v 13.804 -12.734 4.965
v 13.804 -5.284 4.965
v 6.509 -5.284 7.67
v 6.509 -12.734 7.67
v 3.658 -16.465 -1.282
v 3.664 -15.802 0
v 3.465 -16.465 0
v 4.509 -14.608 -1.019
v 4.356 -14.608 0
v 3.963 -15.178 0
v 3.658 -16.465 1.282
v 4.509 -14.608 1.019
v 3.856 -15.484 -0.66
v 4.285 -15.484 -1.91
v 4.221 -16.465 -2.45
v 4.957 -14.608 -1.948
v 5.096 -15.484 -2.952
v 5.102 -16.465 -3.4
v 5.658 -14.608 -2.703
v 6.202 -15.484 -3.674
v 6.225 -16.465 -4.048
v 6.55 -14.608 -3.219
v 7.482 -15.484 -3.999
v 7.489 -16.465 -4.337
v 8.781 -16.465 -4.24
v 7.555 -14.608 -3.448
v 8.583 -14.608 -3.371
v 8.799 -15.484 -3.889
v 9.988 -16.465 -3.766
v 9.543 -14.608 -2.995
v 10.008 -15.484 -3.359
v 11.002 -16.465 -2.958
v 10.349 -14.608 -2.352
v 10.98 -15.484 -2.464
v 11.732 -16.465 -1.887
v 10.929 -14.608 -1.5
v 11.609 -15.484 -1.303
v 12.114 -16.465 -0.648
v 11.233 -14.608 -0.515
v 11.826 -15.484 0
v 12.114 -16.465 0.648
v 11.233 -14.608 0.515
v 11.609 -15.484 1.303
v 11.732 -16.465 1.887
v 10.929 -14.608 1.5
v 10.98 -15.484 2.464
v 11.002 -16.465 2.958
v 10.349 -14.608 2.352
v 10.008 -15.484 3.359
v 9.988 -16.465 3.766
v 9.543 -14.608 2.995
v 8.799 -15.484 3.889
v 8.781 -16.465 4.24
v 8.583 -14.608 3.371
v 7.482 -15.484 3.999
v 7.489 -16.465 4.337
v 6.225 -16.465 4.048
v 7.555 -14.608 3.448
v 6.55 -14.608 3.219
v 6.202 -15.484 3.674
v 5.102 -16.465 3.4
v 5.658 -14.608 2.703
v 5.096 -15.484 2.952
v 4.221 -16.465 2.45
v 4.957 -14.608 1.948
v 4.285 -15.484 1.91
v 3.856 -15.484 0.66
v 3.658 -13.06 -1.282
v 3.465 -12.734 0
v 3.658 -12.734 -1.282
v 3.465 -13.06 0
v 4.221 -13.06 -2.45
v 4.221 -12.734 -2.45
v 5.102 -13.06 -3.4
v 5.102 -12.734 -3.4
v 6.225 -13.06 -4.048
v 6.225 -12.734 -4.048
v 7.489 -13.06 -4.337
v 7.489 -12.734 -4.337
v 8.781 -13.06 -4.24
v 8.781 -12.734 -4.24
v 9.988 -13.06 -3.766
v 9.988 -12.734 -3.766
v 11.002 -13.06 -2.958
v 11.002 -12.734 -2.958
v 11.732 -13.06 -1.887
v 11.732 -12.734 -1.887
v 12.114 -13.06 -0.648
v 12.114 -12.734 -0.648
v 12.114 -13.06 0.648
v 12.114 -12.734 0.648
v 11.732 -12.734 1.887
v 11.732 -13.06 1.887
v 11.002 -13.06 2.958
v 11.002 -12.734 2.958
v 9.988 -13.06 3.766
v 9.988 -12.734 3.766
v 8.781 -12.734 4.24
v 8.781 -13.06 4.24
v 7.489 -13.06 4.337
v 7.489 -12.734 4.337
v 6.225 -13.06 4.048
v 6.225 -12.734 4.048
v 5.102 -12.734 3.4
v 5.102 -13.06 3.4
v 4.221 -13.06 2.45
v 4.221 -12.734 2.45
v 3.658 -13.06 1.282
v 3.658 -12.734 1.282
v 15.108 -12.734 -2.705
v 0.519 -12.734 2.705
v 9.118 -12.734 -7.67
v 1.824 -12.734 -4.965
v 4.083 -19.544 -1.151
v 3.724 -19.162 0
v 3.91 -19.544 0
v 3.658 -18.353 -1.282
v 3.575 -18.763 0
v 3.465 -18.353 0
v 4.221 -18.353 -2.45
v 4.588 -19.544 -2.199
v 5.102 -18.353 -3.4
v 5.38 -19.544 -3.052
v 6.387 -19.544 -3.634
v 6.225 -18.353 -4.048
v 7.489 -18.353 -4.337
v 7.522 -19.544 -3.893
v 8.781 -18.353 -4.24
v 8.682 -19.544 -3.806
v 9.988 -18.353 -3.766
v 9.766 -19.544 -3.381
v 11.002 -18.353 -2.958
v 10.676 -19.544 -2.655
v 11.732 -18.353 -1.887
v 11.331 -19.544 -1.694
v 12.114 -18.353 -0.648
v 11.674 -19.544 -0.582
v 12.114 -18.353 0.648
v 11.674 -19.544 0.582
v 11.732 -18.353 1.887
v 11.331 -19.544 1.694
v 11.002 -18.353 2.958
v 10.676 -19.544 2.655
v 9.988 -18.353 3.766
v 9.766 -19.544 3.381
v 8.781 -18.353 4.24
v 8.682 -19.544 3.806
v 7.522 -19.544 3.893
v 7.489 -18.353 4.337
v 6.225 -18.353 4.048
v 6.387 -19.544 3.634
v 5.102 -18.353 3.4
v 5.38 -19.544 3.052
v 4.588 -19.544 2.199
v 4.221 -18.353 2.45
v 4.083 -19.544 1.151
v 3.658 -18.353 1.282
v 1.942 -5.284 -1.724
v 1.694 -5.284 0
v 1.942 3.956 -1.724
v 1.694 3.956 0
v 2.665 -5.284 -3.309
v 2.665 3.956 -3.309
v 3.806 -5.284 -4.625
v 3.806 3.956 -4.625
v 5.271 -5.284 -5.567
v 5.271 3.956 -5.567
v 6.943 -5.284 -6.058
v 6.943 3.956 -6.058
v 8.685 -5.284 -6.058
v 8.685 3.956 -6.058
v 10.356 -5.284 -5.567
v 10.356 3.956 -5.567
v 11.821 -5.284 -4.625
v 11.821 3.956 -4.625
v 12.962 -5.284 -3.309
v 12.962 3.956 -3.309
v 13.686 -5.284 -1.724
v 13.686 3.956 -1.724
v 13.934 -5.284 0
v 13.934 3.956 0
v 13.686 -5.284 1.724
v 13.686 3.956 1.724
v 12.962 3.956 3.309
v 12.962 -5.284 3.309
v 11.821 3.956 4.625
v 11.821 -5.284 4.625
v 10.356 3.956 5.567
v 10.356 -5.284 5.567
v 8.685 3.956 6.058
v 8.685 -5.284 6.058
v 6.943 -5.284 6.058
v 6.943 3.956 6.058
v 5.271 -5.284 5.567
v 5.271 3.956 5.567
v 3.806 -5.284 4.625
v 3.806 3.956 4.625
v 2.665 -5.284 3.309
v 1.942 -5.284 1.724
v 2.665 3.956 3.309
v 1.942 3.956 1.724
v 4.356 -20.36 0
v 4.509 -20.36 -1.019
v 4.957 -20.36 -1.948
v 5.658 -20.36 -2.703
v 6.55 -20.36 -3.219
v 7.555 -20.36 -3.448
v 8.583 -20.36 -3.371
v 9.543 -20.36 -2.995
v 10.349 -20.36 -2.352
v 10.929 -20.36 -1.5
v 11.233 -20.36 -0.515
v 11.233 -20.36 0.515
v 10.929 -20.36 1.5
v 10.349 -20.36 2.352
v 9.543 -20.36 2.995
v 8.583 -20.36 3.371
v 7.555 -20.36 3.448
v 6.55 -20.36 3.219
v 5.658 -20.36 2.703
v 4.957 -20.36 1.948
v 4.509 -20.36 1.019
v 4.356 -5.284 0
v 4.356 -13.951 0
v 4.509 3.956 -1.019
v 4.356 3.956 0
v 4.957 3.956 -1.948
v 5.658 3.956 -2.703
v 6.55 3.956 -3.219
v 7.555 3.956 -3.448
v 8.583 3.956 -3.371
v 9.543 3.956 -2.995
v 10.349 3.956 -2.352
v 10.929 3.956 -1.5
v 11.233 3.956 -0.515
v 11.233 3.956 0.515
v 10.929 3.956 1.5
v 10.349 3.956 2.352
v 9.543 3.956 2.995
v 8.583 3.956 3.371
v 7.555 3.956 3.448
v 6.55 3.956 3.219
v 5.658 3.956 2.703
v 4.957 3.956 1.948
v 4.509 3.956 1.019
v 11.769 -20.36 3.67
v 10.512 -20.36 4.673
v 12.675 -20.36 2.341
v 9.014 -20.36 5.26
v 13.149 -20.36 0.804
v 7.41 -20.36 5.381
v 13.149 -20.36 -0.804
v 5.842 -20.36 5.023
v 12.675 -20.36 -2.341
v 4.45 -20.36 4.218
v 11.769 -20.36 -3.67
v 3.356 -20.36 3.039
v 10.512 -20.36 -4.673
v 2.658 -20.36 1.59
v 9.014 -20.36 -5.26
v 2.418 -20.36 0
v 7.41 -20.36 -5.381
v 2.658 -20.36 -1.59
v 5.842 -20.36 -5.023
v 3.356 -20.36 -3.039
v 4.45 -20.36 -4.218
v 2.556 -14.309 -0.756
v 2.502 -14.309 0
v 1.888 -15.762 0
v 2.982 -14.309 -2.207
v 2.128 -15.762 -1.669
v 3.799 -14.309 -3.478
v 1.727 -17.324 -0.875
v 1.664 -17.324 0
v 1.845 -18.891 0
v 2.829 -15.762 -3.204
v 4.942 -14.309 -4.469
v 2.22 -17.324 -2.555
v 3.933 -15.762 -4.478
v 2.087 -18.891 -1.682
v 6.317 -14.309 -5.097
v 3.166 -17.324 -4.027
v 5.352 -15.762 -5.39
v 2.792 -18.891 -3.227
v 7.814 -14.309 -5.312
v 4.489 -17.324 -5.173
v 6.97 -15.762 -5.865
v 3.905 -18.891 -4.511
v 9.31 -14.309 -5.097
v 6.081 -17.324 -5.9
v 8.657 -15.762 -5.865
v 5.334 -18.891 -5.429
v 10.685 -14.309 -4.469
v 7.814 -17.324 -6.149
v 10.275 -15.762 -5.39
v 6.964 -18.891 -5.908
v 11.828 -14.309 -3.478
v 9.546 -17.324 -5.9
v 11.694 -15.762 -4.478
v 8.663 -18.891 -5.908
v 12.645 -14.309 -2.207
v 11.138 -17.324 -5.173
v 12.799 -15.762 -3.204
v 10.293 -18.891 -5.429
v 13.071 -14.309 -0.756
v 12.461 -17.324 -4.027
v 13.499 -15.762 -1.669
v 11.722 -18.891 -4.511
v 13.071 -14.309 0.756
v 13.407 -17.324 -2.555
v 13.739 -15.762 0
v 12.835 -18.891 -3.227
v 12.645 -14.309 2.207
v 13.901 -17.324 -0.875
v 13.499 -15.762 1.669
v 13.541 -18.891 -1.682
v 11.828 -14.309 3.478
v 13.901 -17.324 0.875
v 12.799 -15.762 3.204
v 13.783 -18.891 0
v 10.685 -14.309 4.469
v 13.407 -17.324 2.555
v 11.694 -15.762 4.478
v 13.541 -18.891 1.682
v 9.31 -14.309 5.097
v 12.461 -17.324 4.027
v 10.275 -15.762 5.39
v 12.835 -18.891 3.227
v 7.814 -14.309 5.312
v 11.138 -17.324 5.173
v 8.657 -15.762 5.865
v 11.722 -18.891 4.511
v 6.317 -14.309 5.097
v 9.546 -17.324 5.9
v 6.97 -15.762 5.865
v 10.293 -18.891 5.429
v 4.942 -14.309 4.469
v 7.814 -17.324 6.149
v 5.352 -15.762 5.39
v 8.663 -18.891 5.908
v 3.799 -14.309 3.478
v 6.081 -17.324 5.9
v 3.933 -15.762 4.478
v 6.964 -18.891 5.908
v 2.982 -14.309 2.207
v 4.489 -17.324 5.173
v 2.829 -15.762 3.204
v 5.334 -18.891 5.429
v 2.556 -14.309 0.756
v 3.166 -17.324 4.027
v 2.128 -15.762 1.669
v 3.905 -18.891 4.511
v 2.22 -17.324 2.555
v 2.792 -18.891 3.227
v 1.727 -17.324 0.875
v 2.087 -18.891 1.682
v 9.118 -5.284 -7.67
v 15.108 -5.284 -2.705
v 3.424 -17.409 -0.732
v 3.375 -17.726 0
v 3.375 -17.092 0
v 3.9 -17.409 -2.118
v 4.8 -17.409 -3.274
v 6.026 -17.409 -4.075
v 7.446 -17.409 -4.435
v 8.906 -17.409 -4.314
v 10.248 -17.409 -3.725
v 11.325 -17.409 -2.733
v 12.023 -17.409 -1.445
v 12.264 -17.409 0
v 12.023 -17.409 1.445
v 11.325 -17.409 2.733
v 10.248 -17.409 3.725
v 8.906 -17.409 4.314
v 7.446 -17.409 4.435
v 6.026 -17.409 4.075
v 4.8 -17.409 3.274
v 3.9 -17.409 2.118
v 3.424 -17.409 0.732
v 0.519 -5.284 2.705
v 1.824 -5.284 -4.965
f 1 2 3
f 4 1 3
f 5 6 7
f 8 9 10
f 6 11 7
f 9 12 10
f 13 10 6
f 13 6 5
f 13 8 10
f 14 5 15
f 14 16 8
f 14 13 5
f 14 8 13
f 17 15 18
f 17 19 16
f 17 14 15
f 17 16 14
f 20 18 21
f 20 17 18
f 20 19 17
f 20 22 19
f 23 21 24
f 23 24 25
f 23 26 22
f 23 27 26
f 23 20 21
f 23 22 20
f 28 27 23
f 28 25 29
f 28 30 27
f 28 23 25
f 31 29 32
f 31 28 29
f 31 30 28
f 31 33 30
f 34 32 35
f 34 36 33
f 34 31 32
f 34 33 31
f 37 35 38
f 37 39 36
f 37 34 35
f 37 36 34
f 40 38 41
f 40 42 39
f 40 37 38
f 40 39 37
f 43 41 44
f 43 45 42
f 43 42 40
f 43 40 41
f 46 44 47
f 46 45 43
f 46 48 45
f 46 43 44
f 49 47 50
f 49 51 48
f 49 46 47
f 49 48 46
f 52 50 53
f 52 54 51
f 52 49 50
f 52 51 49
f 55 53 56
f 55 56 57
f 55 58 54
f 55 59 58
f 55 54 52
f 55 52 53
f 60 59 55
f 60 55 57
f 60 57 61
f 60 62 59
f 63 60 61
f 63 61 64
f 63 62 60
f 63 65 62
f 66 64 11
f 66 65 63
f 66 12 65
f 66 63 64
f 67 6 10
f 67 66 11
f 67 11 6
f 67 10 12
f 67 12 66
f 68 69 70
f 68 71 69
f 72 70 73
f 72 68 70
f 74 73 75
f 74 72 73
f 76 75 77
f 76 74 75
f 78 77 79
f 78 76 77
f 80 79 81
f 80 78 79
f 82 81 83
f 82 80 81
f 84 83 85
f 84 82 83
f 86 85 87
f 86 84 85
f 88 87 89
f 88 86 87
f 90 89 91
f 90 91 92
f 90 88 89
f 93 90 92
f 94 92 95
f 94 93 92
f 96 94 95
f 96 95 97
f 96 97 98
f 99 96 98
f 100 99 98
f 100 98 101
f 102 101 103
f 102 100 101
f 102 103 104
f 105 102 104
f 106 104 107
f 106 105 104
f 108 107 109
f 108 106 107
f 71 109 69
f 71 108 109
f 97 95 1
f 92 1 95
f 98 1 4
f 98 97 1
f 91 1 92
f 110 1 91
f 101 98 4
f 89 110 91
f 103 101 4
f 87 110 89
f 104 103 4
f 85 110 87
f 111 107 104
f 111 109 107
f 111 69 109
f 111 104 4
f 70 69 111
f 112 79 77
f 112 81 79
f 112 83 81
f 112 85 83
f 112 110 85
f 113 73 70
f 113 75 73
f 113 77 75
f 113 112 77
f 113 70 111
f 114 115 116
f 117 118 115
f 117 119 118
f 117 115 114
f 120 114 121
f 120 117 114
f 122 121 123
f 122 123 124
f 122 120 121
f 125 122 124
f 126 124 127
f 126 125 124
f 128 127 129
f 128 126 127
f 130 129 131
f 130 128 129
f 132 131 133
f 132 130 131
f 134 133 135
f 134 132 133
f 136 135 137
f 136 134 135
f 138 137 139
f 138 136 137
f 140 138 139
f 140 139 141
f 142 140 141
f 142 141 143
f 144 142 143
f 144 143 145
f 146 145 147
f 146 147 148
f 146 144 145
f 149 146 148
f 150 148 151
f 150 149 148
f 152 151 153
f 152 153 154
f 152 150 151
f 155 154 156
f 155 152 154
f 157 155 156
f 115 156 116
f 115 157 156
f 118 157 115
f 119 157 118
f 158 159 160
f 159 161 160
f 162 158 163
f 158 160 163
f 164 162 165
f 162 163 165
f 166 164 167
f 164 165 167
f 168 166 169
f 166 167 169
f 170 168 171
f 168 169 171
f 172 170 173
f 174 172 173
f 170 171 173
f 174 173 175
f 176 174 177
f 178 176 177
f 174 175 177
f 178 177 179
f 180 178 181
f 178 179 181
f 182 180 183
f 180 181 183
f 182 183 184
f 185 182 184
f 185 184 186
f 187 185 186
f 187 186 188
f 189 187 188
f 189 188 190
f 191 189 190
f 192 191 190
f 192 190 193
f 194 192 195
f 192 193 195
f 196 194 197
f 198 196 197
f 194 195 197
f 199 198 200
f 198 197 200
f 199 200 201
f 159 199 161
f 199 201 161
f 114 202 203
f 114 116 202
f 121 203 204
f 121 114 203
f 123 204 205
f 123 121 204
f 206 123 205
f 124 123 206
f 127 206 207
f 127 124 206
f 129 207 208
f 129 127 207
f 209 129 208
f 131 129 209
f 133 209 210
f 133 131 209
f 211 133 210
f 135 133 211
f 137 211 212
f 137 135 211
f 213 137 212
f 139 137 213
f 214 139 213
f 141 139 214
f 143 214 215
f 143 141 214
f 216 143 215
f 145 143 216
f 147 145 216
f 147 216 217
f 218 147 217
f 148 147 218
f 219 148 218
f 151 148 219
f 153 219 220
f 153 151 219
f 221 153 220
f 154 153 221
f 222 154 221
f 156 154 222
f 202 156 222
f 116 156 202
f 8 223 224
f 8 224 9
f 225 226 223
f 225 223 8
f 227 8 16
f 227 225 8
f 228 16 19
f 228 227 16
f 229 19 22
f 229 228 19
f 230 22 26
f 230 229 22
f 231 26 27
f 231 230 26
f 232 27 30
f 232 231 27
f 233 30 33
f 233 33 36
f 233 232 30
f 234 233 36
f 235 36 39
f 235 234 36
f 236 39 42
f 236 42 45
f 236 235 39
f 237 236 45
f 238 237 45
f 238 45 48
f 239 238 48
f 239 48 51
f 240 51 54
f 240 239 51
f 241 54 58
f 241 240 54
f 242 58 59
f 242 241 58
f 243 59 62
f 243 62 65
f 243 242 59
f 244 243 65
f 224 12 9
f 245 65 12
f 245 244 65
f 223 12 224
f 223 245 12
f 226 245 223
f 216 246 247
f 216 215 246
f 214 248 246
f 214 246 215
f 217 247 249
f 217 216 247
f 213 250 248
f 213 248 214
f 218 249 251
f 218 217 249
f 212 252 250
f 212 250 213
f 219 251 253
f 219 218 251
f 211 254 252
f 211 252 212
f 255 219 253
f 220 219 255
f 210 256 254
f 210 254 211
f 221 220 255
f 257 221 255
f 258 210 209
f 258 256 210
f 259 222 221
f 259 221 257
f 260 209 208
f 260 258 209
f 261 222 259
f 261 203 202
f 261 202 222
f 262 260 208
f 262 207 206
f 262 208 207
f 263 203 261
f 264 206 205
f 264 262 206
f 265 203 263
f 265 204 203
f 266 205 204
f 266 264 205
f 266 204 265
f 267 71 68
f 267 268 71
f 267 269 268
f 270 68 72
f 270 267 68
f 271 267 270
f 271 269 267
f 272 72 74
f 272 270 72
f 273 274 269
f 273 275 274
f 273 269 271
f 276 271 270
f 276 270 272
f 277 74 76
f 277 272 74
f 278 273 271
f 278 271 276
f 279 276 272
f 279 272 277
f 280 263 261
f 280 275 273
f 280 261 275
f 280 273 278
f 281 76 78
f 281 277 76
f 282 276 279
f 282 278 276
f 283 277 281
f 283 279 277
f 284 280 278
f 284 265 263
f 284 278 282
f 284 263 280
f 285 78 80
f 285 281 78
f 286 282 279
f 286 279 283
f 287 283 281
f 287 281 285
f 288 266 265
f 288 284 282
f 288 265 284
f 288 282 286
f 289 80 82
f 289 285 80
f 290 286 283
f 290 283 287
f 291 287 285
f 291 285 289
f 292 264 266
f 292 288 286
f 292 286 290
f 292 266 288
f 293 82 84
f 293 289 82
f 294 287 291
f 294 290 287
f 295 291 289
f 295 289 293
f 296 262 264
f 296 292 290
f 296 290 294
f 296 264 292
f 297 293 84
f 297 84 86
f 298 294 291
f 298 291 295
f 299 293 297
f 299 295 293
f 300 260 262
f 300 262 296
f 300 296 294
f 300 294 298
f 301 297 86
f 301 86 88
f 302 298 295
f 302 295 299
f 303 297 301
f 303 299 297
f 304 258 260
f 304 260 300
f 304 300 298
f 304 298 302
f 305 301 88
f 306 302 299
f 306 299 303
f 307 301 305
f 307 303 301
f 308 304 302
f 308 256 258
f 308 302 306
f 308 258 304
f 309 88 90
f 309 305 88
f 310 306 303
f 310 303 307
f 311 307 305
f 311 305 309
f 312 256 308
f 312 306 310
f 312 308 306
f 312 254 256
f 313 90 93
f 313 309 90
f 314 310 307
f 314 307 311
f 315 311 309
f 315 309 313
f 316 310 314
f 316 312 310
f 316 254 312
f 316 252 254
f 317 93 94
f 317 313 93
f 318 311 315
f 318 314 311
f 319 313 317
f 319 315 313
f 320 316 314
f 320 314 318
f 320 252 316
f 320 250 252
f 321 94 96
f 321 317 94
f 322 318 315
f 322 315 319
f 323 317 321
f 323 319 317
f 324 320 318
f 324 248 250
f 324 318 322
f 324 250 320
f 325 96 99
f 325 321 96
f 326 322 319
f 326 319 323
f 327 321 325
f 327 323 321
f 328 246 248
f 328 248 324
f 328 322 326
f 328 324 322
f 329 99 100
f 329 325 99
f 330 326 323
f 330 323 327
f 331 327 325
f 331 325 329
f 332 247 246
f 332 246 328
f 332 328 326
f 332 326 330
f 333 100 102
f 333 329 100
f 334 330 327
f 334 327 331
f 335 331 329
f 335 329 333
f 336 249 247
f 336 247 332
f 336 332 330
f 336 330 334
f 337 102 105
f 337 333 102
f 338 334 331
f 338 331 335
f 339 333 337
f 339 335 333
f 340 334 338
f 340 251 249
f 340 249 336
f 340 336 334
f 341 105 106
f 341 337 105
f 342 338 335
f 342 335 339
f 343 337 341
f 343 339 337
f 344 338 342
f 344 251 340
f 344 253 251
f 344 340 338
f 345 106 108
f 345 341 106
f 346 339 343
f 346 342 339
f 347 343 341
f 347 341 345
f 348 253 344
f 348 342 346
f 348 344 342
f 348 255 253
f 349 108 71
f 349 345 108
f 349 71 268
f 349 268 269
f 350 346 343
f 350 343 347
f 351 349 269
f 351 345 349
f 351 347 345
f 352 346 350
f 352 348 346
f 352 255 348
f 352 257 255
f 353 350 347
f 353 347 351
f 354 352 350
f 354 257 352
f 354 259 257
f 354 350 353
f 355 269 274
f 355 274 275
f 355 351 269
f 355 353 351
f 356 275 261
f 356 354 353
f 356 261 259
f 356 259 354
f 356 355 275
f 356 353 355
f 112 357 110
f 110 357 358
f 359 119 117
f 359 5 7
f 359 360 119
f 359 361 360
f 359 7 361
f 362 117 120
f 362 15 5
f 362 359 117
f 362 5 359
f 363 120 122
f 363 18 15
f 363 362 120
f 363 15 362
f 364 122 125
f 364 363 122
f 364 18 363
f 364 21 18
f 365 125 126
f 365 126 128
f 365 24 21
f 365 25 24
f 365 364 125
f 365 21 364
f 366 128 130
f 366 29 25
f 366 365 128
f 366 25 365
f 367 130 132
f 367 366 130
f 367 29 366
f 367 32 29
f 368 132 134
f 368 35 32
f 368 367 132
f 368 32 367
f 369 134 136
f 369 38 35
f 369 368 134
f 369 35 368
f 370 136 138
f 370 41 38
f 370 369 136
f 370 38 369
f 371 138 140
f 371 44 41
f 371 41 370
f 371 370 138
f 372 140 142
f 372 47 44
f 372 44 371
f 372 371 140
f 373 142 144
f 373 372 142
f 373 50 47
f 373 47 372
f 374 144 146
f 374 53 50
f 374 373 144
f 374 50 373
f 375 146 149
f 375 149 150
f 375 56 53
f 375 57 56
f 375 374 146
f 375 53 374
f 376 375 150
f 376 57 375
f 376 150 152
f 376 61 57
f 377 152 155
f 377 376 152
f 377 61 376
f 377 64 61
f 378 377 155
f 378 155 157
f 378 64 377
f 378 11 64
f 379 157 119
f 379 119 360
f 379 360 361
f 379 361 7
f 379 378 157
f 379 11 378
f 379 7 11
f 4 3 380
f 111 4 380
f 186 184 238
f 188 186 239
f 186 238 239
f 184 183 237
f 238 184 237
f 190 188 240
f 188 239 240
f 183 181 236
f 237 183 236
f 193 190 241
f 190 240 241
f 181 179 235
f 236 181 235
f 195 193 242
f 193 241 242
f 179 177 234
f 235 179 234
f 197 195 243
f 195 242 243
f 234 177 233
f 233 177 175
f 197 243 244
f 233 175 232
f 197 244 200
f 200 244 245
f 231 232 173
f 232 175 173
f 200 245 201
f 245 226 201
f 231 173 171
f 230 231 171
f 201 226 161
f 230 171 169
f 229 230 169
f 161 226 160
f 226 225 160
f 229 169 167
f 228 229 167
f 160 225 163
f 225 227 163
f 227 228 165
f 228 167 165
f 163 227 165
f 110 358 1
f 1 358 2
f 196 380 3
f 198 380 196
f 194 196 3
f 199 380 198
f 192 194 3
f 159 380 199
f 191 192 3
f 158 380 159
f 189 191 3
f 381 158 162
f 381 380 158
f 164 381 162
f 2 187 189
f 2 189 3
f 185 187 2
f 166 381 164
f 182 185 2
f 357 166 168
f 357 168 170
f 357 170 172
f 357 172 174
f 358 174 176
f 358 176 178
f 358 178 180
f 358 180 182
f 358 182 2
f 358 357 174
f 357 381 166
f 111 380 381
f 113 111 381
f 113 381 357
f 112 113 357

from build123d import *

# Parameters (mm, degrees)
CROQUIS1_W            = 2.662106529
CROQUIS1_H            = 9.24
CORTAR_EXTRUIR1_REACH = 25.043


with BuildPart() as part:
    # Croquis1 → Revolución1 (revolve)
    with BuildSketch(Plane.XY):
        with Locations((3.024759969, -0.663755178)):
            Rectangle(CROQUIS1_W, CROQUIS1_H)
        Polygon((4.355813233, -12.733755178), (4.355813233, -5.283755178), (1.693706704, -5.283755178), (0.033706704, -5.283755178), (0.033706704, -12.733755178), (3.465, -12.733755178), align=None)
        Polygon((4.355813233, -13.950813233), (4.355813233, -12.733755178), (3.465, -12.733755178), (3.465, -13.06), align=None)
        with BuildLine():
            Line((4.355813233, -14.607729599), (4.355813233, -13.950813233))
            Line((4.355813233, -13.950813233), (3.465, -13.06))
            Line((3.465, -13.06), (3.465, -16.464646325))
            ThreePointArc((3.465, -16.464646325), (3.80150201, -15.483943474), (4.355813233, -14.607729599))
        make_face()
        with BuildLine():
            Line((3.465, -16.464646325), (3.465, -13.06))
            ThreePointArc((3.465, -13.06), (1.725988008, -16.53567688), (2.418118888, -20.36))
            Line((2.418118888, -20.36), (3.465, -20.36))
            Line((3.465, -20.36), (3.465, -18.352767084))
            ThreePointArc((3.465, -18.352767084), (3.363706704, -17.408706704), (3.465, -16.464646325))
        make_face()
        with BuildLine():
            Line((3.465, -20.36), (4.355813233, -20.36))
            Line((4.355813233, -20.36), (3.909582187, -19.544195349))
            ThreePointArc((3.909582187, -19.544195349), (3.644512403, -18.964444111), (3.465, -18.352767084))
            Line((3.465, -18.352767084), (3.465, -20.36))
        make_face()
    revolve(axis=Axis((7.813706704, 3.956244822, 0), (0, -1, 0)))

    # Croquis2 → Cortar-Extruir1 (cut, up to next)
    with BuildSketch(Plane(origin=(0, -5.283755178, 0), x_dir=(-1, 0, 0), z_dir=(0, 1, 0)), mode=Mode.PRIVATE) as cortar_extruir1_sk1:
        with BuildLine():
            ThreePointArc((-6.509101958, 7.669837447), (-10.518804576, 7.294576445), (-13.803678403, 4.964739575))
            Line((-13.803678403, 4.964739575), (-6.509101958, 7.669837447))
        make_face()
    cortar_extruir1_tool1 = extrude(cortar_extruir1_sk1.sketch, amount=-CORTAR_EXTRUIR1_REACH, mode=Mode.PRIVATE) & part.part
    # Croquis2 → Cortar-Extruir1 (cut, up to next)
    with BuildSketch(Plane(origin=(0, -5.283755178, 0), x_dir=(-1, 0, 0), z_dir=(0, 1, 0)), mode=Mode.PRIVATE) as cortar_extruir1_sk2:
        with BuildLine():
            Line((-15.108283149, -2.705097871), (-13.803678403, 4.964739575))
            ThreePointArc((-13.803678403, 4.964739575), (-15.483544151, 1.304604746), (-15.108283149, -2.705097871))
        make_face()
    cortar_extruir1_tool2 = extrude(cortar_extruir1_sk2.sketch, amount=-CORTAR_EXTRUIR1_REACH, mode=Mode.PRIVATE) & part.part
    # Croquis2 → Cortar-Extruir1 (cut, up to next)
    with BuildSketch(Plane(origin=(0, -5.283755178, 0), x_dir=(-1, 0, 0), z_dir=(0, 1, 0)), mode=Mode.PRIVATE) as cortar_extruir1_sk3:
        with BuildLine():
            Line((-9.11831145, -7.669837447), (-15.108283149, -2.705097871))
            ThreePointArc((-15.108283149, -2.705097871), (-12.77844628, -5.989971699), (-9.11831145, -7.669837447))
        make_face()
    cortar_extruir1_tool3 = extrude(cortar_extruir1_sk3.sketch, amount=-CORTAR_EXTRUIR1_REACH, mode=Mode.PRIVATE) & part.part
    # Croquis2 → Cortar-Extruir1 (cut, up to next)
    with BuildSketch(Plane(origin=(0, -5.283755178, 0), x_dir=(-1, 0, 0), z_dir=(0, 1, 0)), mode=Mode.PRIVATE) as cortar_extruir1_sk4:
        with BuildLine():
            Line((-1.823735006, -4.964739575), (-9.11831145, -7.669837447))
            ThreePointArc((-9.11831145, -7.669837447), (-5.108608833, -7.294576445), (-1.823735006, -4.964739575))
        make_face()
    cortar_extruir1_tool4 = extrude(cortar_extruir1_sk4.sketch, amount=-CORTAR_EXTRUIR1_REACH, mode=Mode.PRIVATE) & part.part
    # Croquis2 → Cortar-Extruir1 (cut, up to next)
    with BuildSketch(Plane(origin=(0, -5.283755178, 0), x_dir=(-1, 0, 0), z_dir=(0, 1, 0)), mode=Mode.PRIVATE) as cortar_extruir1_sk5:
        with BuildLine():
            ThreePointArc((-0.033706704, 0), (-0.156024133, 1.374153423), (-0.51913026, 2.705097871))
            Line((-0.51913026, 2.705097871), (-1.823735006, -4.964739575))
            ThreePointArc((-1.823735006, -4.964739575), (-0.494882351, -2.638789513), (-0.033706704, 0))
        make_face()
    cortar_extruir1_tool5 = extrude(cortar_extruir1_sk5.sketch, amount=-CORTAR_EXTRUIR1_REACH, mode=Mode.PRIVATE) & part.part
    # Croquis2 → Cortar-Extruir1 (cut, up to next)
    with BuildSketch(Plane(origin=(0, -5.283755178, 0), x_dir=(-1, 0, 0), z_dir=(0, 1, 0)), mode=Mode.PRIVATE) as cortar_extruir1_sk6:
        with BuildLine():
            ThreePointArc((-0.51913026, 2.705097871), (-2.848967129, 5.989971699), (-6.509101958, 7.669837447))
            Line((-6.509101958, 7.669837447), (-0.51913026, 2.705097871))
        make_face()
    cortar_extruir1_tool6 = extrude(cortar_extruir1_sk6.sketch, amount=-CORTAR_EXTRUIR1_REACH, mode=Mode.PRIVATE) & part.part
    add(cortar_extruir1_tool1.solids().sort_by_distance((10.302222, -5.283755, 6.710539))[0], mode=Mode.SUBTRACT)
    add(cortar_extruir1_tool2.solids().sort_by_distance((14.869461, -5.283755, 1.200152))[0], mode=Mode.SUBTRACT)
    add(cortar_extruir1_tool3.solids().sort_by_distance((12.380946, -5.283755, -5.510387))[0], mode=Mode.SUBTRACT)
    add(cortar_extruir1_tool4.solids().sort_by_distance((5.325191, -5.283755, -6.710539))[0], mode=Mode.SUBTRACT)
    add(cortar_extruir1_tool5.solids().sort_by_distance((0.757952, -5.283755, -1.200152))[0], mode=Mode.SUBTRACT)
    add(cortar_extruir1_tool6.solids().sort_by_distance((3.246467, -5.283755, 5.510387))[0], mode=Mode.SUBTRACT)


solid = part.part
